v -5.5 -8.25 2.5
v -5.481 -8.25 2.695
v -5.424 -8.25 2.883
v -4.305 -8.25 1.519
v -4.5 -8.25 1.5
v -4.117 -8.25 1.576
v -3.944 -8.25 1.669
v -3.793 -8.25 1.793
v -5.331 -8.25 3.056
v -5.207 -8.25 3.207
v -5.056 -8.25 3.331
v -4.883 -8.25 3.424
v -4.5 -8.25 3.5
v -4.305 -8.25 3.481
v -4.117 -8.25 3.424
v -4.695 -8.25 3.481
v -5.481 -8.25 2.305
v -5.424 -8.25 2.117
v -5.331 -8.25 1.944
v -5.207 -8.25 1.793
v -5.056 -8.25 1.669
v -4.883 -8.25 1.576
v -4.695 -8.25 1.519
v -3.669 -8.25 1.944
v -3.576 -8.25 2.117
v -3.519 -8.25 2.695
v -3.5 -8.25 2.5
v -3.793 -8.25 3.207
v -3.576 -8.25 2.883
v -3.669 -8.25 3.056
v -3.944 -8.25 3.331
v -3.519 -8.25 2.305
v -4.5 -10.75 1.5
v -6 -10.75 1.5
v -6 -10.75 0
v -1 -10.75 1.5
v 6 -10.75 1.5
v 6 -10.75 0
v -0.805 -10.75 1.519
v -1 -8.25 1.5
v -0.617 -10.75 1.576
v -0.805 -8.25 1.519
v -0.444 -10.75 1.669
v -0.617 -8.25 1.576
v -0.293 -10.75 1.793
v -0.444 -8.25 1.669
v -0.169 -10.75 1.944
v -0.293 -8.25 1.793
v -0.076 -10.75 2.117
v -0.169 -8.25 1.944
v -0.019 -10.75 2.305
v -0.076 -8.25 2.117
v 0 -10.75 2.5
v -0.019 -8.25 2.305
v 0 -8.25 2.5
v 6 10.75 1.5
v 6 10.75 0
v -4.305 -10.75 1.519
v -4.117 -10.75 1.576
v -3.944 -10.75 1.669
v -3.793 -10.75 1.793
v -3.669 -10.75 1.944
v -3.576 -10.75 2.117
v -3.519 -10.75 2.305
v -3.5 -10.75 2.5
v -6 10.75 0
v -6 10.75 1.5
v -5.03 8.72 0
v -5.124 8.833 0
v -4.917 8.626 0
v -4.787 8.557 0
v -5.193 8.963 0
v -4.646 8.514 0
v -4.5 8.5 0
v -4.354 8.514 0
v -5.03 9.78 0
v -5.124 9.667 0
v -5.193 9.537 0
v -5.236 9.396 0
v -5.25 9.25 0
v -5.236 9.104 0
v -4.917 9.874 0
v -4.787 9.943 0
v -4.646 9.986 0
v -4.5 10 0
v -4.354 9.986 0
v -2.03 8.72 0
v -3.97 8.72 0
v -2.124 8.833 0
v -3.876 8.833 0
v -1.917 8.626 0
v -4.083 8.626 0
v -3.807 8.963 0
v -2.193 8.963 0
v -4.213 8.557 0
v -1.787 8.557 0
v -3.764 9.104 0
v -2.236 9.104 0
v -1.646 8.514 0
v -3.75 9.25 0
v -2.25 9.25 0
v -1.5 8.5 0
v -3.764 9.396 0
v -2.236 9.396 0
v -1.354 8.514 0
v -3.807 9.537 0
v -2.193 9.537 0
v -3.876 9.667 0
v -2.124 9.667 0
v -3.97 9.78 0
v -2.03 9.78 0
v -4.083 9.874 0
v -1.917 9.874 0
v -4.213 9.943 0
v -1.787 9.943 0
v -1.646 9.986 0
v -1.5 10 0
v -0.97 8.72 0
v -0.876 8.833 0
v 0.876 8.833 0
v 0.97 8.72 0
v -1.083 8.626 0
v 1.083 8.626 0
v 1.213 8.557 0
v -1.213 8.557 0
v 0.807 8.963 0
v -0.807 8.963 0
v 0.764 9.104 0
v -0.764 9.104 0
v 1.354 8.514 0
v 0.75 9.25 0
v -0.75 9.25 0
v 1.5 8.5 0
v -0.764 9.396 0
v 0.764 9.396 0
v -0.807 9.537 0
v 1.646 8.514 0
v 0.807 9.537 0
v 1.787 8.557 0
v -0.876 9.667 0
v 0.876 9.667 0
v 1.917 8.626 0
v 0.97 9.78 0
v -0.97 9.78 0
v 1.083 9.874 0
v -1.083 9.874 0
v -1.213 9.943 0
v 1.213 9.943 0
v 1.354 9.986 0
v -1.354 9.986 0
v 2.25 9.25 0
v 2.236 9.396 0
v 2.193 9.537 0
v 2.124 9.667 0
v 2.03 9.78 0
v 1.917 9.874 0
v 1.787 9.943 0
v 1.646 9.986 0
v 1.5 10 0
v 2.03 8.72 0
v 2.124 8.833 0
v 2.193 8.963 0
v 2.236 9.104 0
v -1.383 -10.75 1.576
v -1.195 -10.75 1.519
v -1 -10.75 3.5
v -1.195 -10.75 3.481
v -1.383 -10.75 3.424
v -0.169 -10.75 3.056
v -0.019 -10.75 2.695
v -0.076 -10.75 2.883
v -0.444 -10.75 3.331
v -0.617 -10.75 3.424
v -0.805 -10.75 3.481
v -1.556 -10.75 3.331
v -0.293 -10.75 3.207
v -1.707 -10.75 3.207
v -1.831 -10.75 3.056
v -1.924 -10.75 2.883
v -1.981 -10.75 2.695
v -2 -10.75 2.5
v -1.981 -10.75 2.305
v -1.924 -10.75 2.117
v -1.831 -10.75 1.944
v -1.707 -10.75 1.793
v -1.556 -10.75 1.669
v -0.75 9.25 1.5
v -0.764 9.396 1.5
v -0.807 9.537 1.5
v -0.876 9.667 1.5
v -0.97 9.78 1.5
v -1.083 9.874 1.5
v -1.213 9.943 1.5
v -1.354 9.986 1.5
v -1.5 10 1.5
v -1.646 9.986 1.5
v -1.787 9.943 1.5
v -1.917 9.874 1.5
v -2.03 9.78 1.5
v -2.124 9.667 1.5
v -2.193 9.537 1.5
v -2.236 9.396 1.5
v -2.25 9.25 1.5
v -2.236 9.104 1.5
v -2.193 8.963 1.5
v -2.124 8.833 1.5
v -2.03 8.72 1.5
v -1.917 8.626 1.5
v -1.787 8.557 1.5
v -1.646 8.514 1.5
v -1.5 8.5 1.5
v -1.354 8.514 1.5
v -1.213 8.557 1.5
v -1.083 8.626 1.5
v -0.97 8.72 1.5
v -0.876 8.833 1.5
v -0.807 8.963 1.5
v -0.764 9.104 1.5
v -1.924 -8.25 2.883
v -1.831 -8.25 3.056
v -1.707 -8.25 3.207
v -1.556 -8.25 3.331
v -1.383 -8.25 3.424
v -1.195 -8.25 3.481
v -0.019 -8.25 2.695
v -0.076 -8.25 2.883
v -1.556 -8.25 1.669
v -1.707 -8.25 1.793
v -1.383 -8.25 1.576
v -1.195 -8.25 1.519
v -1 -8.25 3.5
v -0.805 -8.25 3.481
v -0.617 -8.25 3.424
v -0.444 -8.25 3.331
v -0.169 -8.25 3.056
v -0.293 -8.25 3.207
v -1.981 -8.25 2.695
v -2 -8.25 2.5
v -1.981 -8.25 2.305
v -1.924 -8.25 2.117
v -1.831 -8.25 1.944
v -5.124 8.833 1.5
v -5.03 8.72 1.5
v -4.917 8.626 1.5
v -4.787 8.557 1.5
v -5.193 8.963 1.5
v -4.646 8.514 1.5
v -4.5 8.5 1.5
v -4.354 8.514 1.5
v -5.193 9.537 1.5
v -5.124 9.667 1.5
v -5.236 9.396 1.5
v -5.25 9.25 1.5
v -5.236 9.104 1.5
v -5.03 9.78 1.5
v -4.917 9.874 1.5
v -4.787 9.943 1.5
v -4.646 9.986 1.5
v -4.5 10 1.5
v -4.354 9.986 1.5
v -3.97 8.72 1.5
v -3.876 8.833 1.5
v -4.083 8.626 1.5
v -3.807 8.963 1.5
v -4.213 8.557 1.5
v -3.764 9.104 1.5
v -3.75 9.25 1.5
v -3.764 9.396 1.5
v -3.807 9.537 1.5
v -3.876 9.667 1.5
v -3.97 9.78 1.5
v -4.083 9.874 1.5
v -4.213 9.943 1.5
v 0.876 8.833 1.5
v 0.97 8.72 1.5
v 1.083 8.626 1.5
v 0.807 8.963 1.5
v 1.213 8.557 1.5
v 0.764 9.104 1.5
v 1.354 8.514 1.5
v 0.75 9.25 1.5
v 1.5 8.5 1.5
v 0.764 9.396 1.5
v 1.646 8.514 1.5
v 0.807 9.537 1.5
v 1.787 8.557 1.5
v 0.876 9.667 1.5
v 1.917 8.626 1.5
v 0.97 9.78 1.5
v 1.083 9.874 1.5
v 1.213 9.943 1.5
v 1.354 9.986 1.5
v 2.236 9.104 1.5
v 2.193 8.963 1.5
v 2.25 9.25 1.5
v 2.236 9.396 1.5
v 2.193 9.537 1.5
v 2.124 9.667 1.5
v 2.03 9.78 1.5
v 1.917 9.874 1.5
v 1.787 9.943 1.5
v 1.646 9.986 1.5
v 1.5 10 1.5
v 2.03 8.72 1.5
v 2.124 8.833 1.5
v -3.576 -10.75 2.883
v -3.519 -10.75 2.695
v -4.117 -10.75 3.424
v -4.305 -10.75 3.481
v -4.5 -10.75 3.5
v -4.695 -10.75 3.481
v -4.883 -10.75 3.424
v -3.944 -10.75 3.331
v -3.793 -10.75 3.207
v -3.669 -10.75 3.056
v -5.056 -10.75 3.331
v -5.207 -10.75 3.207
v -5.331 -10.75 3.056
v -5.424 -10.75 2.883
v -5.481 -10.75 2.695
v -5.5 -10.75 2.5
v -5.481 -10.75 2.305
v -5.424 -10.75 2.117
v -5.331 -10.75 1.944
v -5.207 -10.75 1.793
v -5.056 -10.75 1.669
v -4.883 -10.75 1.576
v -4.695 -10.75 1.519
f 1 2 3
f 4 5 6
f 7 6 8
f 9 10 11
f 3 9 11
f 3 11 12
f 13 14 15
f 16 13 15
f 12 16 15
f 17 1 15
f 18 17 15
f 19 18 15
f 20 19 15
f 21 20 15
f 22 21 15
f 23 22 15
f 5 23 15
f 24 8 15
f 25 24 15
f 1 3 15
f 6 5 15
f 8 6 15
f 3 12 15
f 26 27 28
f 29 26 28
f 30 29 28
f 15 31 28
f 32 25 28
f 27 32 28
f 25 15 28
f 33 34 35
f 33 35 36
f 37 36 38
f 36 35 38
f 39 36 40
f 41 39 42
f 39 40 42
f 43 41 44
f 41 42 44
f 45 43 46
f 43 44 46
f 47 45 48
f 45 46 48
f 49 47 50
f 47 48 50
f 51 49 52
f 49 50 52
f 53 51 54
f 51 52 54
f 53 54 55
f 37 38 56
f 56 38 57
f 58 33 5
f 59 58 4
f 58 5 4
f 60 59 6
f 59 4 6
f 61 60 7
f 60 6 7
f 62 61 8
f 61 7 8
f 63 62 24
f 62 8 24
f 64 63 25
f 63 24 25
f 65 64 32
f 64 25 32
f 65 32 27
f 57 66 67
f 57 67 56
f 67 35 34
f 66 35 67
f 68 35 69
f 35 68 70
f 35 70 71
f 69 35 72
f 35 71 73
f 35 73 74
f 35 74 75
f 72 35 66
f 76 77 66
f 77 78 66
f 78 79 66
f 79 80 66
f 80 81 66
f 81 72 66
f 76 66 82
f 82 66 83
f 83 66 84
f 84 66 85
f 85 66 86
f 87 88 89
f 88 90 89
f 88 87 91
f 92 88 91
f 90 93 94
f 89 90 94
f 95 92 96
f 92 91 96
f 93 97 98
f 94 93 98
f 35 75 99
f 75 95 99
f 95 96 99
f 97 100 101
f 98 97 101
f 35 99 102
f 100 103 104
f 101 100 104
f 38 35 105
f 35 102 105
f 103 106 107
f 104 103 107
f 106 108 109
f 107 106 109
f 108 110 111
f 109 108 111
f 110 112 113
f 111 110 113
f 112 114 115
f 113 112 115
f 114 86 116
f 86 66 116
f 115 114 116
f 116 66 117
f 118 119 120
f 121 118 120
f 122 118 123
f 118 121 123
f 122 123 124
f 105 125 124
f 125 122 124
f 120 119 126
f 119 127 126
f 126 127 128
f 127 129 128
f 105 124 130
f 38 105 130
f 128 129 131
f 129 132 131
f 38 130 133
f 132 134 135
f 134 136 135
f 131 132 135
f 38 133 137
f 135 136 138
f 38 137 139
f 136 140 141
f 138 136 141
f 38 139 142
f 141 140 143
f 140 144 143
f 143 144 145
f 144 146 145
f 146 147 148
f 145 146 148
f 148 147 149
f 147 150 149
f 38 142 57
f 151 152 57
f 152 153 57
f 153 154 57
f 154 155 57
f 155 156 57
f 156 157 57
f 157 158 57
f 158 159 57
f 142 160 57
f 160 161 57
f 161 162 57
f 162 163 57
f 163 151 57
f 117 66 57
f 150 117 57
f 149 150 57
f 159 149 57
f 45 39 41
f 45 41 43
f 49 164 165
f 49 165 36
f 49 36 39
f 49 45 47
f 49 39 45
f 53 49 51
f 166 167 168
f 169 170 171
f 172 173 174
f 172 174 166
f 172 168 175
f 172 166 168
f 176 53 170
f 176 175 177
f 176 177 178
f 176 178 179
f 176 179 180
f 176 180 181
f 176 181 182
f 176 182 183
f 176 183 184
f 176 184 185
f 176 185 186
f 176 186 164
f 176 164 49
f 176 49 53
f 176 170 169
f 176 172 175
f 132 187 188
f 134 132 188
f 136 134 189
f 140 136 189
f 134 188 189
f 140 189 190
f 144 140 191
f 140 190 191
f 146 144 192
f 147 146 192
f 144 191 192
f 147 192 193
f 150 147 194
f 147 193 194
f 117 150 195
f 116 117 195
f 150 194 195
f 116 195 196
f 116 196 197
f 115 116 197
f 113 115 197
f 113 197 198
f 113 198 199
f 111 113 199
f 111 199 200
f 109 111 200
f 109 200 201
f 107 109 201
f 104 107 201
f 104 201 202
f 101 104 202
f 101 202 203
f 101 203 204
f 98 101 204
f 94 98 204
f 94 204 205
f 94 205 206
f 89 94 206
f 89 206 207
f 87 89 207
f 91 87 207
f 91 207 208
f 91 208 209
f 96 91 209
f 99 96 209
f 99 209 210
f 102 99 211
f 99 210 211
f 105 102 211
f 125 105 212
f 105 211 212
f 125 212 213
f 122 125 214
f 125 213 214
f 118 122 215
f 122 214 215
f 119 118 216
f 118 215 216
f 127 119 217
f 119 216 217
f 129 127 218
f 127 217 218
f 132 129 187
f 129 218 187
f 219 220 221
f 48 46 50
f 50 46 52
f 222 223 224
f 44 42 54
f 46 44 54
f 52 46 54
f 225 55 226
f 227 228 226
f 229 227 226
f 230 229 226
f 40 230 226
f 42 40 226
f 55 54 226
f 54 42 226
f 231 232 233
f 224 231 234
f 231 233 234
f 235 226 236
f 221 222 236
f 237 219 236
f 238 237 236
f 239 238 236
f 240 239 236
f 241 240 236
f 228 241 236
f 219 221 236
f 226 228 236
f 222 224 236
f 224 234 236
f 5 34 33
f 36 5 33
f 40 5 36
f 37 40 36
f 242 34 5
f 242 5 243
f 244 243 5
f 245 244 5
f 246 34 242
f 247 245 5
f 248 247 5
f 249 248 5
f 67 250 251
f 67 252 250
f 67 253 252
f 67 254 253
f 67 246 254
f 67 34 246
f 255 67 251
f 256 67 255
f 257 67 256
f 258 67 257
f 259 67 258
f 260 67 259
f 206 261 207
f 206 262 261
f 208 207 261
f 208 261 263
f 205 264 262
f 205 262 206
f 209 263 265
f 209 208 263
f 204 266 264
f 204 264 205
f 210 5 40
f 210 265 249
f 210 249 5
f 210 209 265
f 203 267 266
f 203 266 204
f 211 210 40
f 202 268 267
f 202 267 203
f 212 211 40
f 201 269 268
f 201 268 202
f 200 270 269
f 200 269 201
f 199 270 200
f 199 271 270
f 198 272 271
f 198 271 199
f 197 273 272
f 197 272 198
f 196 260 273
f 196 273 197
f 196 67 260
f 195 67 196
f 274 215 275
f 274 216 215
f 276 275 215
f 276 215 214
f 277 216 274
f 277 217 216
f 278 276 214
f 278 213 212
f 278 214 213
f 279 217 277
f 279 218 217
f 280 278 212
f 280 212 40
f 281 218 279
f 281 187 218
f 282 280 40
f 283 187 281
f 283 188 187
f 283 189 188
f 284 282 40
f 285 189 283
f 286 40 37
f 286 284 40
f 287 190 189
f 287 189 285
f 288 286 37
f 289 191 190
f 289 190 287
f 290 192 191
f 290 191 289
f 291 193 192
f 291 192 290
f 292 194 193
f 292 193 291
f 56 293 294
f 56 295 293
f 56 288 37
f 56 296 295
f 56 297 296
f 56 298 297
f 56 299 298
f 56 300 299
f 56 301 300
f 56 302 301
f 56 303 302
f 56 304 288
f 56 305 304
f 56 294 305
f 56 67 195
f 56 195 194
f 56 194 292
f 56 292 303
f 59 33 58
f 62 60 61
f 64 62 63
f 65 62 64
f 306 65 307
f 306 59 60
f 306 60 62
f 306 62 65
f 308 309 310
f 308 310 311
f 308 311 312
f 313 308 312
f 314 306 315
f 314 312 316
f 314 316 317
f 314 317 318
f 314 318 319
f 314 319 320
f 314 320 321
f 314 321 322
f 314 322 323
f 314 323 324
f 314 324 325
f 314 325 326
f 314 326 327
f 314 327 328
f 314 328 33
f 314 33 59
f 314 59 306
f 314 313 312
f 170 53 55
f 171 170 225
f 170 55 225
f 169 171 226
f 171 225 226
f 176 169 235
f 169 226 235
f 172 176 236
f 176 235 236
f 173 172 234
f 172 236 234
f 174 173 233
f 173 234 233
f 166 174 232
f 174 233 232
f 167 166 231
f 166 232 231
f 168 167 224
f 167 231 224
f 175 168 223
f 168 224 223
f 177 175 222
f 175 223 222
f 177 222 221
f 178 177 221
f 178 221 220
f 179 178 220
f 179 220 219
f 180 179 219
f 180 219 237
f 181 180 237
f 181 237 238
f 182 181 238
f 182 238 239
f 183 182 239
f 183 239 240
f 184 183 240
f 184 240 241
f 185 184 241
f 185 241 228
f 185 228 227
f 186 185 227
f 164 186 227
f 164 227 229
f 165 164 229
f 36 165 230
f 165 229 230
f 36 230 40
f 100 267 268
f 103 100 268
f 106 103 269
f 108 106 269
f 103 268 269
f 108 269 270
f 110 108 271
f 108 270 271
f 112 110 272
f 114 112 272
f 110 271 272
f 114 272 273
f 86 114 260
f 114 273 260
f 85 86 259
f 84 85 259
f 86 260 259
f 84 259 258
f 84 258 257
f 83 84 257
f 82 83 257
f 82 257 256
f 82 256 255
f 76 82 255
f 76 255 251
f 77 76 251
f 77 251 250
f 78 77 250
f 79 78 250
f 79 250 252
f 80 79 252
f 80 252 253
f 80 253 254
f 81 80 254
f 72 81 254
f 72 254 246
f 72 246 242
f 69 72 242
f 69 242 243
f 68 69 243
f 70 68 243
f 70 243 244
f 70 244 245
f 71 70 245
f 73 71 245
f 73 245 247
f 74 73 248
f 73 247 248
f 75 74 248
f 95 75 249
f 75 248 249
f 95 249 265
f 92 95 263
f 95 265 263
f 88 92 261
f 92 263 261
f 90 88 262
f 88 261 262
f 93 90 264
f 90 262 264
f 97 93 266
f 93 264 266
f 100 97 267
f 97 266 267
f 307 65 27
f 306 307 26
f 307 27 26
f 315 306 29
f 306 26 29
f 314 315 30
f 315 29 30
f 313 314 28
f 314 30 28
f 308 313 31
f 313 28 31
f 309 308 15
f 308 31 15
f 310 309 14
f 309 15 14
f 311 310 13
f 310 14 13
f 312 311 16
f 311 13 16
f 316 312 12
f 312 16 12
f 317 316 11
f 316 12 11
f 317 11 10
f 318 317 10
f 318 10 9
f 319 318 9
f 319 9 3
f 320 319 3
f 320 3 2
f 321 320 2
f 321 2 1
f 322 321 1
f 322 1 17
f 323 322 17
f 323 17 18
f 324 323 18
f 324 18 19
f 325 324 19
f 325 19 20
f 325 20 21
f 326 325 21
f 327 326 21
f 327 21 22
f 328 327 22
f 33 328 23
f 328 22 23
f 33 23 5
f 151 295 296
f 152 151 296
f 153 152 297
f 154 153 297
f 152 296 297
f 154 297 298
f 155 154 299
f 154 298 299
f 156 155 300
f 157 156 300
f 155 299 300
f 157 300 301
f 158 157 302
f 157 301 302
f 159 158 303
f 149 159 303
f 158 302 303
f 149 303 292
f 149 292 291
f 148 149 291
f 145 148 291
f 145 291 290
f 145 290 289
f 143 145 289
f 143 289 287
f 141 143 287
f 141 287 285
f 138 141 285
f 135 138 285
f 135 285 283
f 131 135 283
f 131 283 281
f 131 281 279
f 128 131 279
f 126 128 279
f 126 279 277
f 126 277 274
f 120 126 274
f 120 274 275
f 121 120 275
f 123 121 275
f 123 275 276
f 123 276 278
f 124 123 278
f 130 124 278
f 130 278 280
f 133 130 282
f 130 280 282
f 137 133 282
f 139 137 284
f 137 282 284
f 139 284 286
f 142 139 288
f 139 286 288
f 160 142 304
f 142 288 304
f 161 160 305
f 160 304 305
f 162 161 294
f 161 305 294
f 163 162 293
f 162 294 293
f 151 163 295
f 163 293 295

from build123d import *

# Parameters (mm, degrees)
F0_W     = 12
F0_H     = 21.5
F1_DEPTH = 1.5
F3_R     = 1
F4_DEPTH = 2.5
F5_R     = 0.75
F6_DEPTH = 1.501


with BuildPart() as f1:
    # F0 (on Top) → F1 (new body)
    with BuildSketch(Plane.XY):
        Rectangle(F0_W, F0_H)
    extrude(amount=F1_DEPTH)

    # F3 (on offset) → F4 (join, through all)
    with BuildSketch(Plane.XZ.offset(8.25)):
        with Locations((-4.5, 2.5)):
            Circle(F3_R)
        with Locations((-1, 2.5)):
            Circle(F3_R)
    extrude(amount=F4_DEPTH)

    # F5 (on face) → F6 (cut, through all)
    with BuildSketch(Plane.XY.offset(1.5)):
        with Locations((-4.5, 9.25)):
            Circle(F5_R)
        with Locations((-1.5, 9.25)):
            Circle(F5_R)
        with Locations((1.5, 9.25)):
            Circle(F5_R)
    extrude(amount=-F6_DEPTH, mode=Mode.SUBTRACT)


solid = f1.part
